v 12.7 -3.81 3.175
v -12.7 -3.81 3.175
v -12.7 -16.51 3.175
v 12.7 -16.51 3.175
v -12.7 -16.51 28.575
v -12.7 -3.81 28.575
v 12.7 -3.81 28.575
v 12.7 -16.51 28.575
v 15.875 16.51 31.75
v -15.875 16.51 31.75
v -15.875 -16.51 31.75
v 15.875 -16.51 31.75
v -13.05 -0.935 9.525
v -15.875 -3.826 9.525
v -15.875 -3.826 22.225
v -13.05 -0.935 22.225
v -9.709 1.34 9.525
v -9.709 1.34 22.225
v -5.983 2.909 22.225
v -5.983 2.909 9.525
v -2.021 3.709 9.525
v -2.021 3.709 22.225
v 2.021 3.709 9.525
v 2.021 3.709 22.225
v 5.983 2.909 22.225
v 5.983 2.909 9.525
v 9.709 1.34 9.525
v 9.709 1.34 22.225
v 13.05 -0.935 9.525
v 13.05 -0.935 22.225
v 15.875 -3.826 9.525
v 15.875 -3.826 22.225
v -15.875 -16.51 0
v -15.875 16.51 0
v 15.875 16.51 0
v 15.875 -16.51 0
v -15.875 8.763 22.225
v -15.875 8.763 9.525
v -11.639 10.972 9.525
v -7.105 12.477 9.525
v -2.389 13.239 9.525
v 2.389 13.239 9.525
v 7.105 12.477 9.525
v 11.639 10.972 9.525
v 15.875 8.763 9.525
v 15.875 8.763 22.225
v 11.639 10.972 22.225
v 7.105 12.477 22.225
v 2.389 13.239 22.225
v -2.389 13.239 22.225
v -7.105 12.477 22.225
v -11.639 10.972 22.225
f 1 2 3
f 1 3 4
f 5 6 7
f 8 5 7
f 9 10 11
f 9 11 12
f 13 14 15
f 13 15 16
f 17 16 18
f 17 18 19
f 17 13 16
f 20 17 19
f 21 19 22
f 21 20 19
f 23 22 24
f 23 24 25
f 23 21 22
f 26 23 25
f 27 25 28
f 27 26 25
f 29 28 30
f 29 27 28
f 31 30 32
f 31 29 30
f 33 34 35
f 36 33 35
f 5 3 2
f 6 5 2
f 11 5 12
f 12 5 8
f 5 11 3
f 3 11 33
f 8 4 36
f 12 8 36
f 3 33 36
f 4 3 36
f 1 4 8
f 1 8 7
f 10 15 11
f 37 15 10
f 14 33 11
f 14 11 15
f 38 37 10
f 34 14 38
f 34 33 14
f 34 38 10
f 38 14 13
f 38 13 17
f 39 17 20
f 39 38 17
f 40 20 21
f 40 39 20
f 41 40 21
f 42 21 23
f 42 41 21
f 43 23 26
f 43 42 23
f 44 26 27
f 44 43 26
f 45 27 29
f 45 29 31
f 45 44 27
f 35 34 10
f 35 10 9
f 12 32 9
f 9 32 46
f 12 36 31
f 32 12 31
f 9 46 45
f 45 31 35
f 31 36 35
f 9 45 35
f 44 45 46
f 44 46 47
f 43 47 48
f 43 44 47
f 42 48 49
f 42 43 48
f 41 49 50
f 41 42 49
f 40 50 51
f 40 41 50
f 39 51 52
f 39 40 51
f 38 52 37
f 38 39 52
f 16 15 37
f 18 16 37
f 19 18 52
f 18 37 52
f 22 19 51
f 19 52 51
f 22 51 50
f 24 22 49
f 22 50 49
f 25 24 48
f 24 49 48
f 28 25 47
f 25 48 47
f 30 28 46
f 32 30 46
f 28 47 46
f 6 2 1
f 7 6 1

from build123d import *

# Parameters (mm, degrees)
SKETCH1_W           = 31.75
SKETCH1_H           = 33.02
BOSS_EXTRUDE1_DEPTH = 31.75
CUT_EXTRUDE1_START  = 3.175
SKETCH1_3_W         = 25.4
SKETCH1_3_H         = 12.7
CUT_EXTRUDE1_DEPTH  = 25.4
CUT_EXTRUDE2_START  = 9.525
CUT_EXTRUDE2_DEPTH  = 12.7


with BuildPart() as part:
    # Sketch1 → Boss-Extrude1 (new body)
    with BuildSketch(Plane.XY):
        Rectangle(SKETCH1_W, SKETCH1_H)
    extrude(amount=BOSS_EXTRUDE1_DEPTH)

    # Sketch1<3> → Cut-Extrude1 (cut)
    with BuildSketch(Plane.XY.offset(CUT_EXTRUDE1_START)):
        with Locations((0, -10.16)):
            Rectangle(SKETCH1_3_W, SKETCH1_3_H)
    extrude(amount=CUT_EXTRUDE1_DEPTH, mode=Mode.SUBTRACT)

    # Sketch1<4> → Cut-Extrude2 (cut)
    with BuildSketch(Plane.XY.offset(CUT_EXTRUDE2_START)):
        with BuildLine():
            Line((-15.875, 8.762680903), (-15.875, -3.825884934))
            ThreePointArc((-15.875, -3.825884934), (0, 3.81), (15.875, -3.825884934))
            Line((15.875, -3.825884934), (15.875, 8.762680903))
            ThreePointArc((15.875, 8.762680903), (0, 13.335), (-15.875, 8.762680903))
        make_face()
    extrude(amount=CUT_EXTRUDE2_DEPTH, mode=Mode.SUBTRACT)


solid = part.part
